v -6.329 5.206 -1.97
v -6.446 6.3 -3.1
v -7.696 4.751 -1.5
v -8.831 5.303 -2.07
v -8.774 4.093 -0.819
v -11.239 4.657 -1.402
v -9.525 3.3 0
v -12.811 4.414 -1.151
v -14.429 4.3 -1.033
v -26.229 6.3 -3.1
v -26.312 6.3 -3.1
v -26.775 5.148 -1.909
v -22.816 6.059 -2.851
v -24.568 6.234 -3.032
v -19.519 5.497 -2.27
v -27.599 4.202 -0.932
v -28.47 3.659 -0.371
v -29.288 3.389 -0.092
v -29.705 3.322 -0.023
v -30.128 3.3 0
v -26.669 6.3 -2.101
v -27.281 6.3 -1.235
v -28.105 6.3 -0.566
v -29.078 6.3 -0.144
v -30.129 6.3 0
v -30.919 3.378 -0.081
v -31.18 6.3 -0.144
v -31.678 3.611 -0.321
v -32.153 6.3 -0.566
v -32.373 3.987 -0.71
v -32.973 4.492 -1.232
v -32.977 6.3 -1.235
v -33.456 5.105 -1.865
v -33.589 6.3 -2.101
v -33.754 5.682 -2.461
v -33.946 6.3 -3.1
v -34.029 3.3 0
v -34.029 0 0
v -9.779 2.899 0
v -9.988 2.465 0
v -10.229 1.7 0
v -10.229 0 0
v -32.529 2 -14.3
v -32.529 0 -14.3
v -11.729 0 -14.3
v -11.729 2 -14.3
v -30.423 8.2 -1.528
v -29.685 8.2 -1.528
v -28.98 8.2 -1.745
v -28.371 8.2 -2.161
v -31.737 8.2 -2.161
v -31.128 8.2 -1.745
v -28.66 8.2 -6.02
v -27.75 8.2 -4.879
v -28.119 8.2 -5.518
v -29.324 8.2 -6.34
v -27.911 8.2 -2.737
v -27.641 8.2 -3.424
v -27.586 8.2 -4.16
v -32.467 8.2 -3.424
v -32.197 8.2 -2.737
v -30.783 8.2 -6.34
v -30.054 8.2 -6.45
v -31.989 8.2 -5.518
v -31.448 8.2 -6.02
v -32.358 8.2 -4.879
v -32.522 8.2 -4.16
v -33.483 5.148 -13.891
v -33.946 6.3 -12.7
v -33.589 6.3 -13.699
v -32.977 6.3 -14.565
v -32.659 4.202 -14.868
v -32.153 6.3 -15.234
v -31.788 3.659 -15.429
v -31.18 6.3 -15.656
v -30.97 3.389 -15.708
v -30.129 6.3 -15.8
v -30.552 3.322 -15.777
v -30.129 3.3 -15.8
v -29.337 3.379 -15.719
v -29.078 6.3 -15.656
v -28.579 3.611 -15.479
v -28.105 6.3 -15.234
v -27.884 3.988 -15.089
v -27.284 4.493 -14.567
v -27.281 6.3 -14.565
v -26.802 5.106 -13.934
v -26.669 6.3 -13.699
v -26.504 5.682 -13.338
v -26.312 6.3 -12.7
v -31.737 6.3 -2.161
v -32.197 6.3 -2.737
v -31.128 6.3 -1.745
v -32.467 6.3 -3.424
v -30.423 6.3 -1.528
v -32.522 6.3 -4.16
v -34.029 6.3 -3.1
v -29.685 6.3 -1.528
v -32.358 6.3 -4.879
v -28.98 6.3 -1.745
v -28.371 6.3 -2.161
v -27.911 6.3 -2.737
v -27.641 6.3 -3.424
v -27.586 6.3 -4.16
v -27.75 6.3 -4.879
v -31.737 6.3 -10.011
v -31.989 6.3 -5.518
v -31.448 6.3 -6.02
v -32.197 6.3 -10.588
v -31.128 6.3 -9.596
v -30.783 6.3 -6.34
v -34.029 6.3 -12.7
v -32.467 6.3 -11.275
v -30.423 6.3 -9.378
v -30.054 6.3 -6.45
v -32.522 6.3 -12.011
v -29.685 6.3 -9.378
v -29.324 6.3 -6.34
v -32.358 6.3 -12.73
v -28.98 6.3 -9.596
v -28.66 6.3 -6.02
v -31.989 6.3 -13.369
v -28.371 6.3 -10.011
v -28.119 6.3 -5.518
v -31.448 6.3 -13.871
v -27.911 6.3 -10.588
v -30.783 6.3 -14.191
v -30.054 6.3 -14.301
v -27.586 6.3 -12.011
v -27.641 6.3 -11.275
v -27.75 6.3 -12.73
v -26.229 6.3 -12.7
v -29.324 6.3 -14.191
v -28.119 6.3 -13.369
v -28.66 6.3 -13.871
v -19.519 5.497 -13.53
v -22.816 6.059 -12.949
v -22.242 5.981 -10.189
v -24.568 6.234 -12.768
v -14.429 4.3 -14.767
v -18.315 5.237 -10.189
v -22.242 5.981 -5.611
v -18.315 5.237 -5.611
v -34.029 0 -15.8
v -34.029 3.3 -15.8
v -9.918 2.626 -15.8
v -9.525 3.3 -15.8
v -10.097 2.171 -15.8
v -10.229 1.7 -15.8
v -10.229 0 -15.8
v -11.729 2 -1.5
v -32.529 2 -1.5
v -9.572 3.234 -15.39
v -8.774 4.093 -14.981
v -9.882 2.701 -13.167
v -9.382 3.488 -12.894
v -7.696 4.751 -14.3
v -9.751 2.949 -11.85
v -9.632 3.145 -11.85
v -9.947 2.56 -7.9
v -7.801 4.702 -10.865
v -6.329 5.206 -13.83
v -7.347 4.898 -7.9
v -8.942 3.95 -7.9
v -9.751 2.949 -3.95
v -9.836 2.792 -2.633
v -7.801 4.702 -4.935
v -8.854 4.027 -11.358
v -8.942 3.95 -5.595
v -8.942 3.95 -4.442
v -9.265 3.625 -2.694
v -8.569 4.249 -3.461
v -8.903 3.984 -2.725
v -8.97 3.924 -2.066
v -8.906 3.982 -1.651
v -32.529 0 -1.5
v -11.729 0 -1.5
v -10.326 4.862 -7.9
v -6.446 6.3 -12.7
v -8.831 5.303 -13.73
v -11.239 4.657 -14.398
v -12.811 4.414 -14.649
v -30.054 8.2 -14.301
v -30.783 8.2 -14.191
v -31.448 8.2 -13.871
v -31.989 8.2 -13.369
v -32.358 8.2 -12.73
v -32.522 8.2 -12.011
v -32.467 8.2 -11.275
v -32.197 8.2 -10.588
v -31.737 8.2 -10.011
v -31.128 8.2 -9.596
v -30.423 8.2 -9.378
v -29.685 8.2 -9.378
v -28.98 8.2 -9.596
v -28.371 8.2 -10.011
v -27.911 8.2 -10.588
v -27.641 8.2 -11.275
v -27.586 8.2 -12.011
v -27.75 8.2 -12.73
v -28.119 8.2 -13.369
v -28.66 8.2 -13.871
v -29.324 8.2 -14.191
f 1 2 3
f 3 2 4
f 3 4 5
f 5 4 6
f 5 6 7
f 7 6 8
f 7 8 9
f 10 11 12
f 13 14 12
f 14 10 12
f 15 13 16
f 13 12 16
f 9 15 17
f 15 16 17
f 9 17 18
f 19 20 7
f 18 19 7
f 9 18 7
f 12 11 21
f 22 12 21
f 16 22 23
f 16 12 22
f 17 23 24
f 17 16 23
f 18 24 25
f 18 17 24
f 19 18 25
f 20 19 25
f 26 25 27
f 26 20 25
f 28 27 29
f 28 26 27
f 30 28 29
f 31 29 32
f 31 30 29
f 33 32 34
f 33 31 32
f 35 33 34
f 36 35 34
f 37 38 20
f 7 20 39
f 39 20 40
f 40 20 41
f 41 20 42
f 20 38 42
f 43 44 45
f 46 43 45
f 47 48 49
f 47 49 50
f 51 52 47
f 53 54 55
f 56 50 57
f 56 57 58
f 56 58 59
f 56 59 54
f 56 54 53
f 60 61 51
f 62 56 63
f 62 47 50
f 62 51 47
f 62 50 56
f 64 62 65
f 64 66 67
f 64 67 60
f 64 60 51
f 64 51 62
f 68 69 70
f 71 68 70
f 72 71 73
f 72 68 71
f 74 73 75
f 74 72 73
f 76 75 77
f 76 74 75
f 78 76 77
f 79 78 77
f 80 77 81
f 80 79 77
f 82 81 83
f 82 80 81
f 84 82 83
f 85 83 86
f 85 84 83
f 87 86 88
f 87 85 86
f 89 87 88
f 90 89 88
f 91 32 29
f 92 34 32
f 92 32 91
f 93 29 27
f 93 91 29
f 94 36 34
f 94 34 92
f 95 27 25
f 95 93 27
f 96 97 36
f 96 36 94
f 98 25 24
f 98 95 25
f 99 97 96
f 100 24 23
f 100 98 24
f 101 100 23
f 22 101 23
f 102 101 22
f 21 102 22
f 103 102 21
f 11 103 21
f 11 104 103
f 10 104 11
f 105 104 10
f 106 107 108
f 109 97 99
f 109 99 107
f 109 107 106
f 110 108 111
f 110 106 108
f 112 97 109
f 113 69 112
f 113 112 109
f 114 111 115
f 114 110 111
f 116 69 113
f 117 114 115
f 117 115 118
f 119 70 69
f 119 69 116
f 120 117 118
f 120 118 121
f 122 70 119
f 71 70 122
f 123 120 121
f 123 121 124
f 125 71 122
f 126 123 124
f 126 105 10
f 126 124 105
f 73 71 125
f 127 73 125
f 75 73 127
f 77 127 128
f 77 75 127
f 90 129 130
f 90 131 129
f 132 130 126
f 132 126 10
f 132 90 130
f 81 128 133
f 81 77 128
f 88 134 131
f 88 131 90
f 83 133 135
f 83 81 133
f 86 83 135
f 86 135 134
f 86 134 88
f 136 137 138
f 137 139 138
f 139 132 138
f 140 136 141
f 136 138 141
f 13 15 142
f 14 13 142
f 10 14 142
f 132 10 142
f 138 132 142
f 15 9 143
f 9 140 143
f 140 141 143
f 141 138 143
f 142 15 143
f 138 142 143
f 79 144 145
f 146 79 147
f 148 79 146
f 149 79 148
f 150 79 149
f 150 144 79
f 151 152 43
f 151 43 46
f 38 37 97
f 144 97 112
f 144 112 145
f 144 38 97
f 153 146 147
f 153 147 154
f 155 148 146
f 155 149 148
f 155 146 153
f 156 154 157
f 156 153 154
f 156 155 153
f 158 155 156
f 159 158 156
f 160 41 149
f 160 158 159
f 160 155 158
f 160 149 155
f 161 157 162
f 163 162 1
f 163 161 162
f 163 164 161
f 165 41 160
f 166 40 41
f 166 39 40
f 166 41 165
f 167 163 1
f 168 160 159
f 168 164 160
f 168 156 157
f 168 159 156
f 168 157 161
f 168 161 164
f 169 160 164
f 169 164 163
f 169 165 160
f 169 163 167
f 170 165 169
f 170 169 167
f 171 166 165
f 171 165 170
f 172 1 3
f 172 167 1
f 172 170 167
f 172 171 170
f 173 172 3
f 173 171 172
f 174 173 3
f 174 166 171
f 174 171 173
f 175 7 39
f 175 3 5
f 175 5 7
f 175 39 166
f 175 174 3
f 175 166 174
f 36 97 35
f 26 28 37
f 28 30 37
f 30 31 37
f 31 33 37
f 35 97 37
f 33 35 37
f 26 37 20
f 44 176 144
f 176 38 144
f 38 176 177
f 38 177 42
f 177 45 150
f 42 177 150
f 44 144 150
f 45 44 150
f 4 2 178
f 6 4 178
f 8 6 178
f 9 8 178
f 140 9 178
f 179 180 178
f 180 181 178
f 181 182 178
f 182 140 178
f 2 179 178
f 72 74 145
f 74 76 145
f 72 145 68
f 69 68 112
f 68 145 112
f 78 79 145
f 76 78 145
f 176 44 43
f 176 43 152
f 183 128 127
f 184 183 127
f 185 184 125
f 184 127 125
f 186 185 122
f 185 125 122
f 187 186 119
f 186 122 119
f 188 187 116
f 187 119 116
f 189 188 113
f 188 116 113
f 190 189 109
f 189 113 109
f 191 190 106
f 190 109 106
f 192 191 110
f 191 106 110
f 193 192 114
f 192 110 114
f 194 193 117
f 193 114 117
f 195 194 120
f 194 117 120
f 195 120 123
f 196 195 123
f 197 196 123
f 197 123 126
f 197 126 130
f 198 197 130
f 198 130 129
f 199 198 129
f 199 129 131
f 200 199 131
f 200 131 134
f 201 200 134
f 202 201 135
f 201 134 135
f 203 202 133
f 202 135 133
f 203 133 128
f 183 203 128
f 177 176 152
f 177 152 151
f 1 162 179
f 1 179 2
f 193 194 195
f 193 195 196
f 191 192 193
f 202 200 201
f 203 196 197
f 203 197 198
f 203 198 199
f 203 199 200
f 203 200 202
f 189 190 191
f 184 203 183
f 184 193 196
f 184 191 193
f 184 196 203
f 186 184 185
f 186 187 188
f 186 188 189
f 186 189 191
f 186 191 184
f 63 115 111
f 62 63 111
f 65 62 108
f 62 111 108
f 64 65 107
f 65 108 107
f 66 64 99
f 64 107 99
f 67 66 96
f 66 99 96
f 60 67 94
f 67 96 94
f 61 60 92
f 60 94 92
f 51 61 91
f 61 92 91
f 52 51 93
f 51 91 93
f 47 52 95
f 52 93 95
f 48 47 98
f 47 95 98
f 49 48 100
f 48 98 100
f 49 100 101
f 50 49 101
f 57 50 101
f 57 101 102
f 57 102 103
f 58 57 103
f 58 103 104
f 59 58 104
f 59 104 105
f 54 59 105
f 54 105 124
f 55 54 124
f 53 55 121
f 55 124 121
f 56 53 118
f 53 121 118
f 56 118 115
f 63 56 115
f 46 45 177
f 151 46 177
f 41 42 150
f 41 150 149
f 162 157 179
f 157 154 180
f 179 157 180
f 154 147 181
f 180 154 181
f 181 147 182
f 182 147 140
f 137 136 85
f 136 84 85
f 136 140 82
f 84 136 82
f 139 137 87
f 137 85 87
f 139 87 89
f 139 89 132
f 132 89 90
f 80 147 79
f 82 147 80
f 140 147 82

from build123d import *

# Parameters (mm, degrees)
SKETCH1_W           = 27.7
SKETCH1_H           = 15.8
BOSS_EXTRUDE1_DEPTH = 6.3
SKETCH2_OUTSIDE_W   = 36.202
SKETCH2_OUTSIDE_H   = 14.802
CUT_EXTRUDE1_DEPTH  = 15.9
SKETCH3_OUTSIDE_W   = 24.302
SKETCH3_OUTSIDE_H   = 14.802
CUT_EXTRUDE2_DEPTH  = 35.9
BOSS_EXTRUDE2_DEPTH = 6.3
SKETCH5_R           = 2.475
BOSS_EXTRUDE3_DEPTH = 1.9
SKETCH6_W           = 20.8
SKETCH6_H           = 12.8
CUT_EXTRUDE3_DEPTH  = 2


with BuildPart() as part:
    # Sketch1 → Boss-Extrude1 (new body)
    with BuildSketch(Plane(origin=(0, 0, 0), x_dir=(1, 0, 0), z_dir=(0, 1, 0))):
        with Locations((-20.178976781, 7.9)):
            Rectangle(SKETCH1_W, SKETCH1_H)
    extrude(amount=BOSS_EXTRUDE1_DEPTH)

    # Sketch2 outside → Cut-Extrude1 (cut)
    with BuildSketch(Plane.XY):
        with Locations((-20.179, 3.15)):
            Rectangle(SKETCH2_OUTSIDE_W, SKETCH2_OUTSIDE_H)
        with BuildLine():
            Line((-34.028976781, 0), (-10.228976781, 0))
            Line((-10.228976781, 0), (-10.228976781, 1.7))
            add(Edge.make_bspline(
                [(-10.228976781, 1.7), (-9.604071017, 4.446739352), (-6.328976781, 5.206240769)],
                knots=[0, 0, 0, 1, 1, 1], degree=2))
            Line((-6.328976781, 5.206240769), (-6.445984235, 6.3))
            add(Edge.make_bspline(
                [(-14.428976781, 4.3), (-10.215266521, 4.423026161), (-6.445984235, 6.3)],
                knots=[0, 0, 0, 1, 1, 1], degree=2))
            add(Edge.make_bspline(
                [(-26.228976781, 6.3), (-22.205866261, 6.270484551), (-18.300973194, 5.255436261), (-14.428976781, 4.3)],
                knots=[0, 0, 0, 0, 1, 1, 1, 1], degree=3))
            Line((-26.228976781, 6.3), (-34.028976781, 6.3))
            Line((-34.028976781, 6.3), (-34.028976781, 0))
        make_face(mode=Mode.SUBTRACT)
    extrude(amount=-CUT_EXTRUDE1_DEPTH, mode=Mode.SUBTRACT)

    # Sketch3 outside → Cut-Extrude2 (cut)
    with BuildSketch(Plane.ZY.offset(34.028976781)):
        with Locations((-7.9, 3.15)):
            Rectangle(SKETCH3_OUTSIDE_W, SKETCH3_OUTSIDE_H)
        Polygon((-15.8, 0), (-15.8, 3.3), (-12.7, 6.3), (-3.1, 6.3), (0, 3.3), (0, 0), align=None, mode=Mode.SUBTRACT)
    extrude(amount=-CUT_EXTRUDE2_DEPTH, mode=Mode.SUBTRACT)

    # Sketch4 → Boss-Extrude2 (add)
    with BuildSketch(Plane.XZ):
        with BuildLine():
            Line((-34.028976781, -3.9), (-34.028976781, -11.9))
            ThreePointArc((-34.028976781, -11.9), (-30.128976781, -15.8), (-26.228976781, -11.9))
            Line((-26.228976781, -11.9), (-26.228976781, -3.899999628))
            ThreePointArc((-26.228976781, -3.899999628), (-30.128976967, 1.86e-07), (-34.028976781, -3.9))
        make_face()
    extrude(amount=-BOSS_EXTRUDE2_DEPTH)

    # Sketch5 → Boss-Extrude3 (add)
    with BuildSketch(Plane(origin=(0, 6.3, 0), x_dir=(1, 0, 0), z_dir=(0, 1, 0))):
        with Locations(Location((-30.053976781, 11.82570761, 0), (0, 0, 90))):
            Circle(SKETCH5_R)
        with Locations(Location((-30.053976781, 3.974999814, 0), (0, 0, 90))):
            Circle(SKETCH5_R)
    extrude(amount=BOSS_EXTRUDE3_DEPTH)

    # Sketch6 → Cut-Extrude3 (cut)
    with BuildSketch(Plane.XZ):
        with Locations((-22.128976781, -7.9)):
            Rectangle(SKETCH6_W, SKETCH6_H)
    extrude(amount=-CUT_EXTRUDE3_DEPTH, mode=Mode.SUBTRACT)


solid = part.part
